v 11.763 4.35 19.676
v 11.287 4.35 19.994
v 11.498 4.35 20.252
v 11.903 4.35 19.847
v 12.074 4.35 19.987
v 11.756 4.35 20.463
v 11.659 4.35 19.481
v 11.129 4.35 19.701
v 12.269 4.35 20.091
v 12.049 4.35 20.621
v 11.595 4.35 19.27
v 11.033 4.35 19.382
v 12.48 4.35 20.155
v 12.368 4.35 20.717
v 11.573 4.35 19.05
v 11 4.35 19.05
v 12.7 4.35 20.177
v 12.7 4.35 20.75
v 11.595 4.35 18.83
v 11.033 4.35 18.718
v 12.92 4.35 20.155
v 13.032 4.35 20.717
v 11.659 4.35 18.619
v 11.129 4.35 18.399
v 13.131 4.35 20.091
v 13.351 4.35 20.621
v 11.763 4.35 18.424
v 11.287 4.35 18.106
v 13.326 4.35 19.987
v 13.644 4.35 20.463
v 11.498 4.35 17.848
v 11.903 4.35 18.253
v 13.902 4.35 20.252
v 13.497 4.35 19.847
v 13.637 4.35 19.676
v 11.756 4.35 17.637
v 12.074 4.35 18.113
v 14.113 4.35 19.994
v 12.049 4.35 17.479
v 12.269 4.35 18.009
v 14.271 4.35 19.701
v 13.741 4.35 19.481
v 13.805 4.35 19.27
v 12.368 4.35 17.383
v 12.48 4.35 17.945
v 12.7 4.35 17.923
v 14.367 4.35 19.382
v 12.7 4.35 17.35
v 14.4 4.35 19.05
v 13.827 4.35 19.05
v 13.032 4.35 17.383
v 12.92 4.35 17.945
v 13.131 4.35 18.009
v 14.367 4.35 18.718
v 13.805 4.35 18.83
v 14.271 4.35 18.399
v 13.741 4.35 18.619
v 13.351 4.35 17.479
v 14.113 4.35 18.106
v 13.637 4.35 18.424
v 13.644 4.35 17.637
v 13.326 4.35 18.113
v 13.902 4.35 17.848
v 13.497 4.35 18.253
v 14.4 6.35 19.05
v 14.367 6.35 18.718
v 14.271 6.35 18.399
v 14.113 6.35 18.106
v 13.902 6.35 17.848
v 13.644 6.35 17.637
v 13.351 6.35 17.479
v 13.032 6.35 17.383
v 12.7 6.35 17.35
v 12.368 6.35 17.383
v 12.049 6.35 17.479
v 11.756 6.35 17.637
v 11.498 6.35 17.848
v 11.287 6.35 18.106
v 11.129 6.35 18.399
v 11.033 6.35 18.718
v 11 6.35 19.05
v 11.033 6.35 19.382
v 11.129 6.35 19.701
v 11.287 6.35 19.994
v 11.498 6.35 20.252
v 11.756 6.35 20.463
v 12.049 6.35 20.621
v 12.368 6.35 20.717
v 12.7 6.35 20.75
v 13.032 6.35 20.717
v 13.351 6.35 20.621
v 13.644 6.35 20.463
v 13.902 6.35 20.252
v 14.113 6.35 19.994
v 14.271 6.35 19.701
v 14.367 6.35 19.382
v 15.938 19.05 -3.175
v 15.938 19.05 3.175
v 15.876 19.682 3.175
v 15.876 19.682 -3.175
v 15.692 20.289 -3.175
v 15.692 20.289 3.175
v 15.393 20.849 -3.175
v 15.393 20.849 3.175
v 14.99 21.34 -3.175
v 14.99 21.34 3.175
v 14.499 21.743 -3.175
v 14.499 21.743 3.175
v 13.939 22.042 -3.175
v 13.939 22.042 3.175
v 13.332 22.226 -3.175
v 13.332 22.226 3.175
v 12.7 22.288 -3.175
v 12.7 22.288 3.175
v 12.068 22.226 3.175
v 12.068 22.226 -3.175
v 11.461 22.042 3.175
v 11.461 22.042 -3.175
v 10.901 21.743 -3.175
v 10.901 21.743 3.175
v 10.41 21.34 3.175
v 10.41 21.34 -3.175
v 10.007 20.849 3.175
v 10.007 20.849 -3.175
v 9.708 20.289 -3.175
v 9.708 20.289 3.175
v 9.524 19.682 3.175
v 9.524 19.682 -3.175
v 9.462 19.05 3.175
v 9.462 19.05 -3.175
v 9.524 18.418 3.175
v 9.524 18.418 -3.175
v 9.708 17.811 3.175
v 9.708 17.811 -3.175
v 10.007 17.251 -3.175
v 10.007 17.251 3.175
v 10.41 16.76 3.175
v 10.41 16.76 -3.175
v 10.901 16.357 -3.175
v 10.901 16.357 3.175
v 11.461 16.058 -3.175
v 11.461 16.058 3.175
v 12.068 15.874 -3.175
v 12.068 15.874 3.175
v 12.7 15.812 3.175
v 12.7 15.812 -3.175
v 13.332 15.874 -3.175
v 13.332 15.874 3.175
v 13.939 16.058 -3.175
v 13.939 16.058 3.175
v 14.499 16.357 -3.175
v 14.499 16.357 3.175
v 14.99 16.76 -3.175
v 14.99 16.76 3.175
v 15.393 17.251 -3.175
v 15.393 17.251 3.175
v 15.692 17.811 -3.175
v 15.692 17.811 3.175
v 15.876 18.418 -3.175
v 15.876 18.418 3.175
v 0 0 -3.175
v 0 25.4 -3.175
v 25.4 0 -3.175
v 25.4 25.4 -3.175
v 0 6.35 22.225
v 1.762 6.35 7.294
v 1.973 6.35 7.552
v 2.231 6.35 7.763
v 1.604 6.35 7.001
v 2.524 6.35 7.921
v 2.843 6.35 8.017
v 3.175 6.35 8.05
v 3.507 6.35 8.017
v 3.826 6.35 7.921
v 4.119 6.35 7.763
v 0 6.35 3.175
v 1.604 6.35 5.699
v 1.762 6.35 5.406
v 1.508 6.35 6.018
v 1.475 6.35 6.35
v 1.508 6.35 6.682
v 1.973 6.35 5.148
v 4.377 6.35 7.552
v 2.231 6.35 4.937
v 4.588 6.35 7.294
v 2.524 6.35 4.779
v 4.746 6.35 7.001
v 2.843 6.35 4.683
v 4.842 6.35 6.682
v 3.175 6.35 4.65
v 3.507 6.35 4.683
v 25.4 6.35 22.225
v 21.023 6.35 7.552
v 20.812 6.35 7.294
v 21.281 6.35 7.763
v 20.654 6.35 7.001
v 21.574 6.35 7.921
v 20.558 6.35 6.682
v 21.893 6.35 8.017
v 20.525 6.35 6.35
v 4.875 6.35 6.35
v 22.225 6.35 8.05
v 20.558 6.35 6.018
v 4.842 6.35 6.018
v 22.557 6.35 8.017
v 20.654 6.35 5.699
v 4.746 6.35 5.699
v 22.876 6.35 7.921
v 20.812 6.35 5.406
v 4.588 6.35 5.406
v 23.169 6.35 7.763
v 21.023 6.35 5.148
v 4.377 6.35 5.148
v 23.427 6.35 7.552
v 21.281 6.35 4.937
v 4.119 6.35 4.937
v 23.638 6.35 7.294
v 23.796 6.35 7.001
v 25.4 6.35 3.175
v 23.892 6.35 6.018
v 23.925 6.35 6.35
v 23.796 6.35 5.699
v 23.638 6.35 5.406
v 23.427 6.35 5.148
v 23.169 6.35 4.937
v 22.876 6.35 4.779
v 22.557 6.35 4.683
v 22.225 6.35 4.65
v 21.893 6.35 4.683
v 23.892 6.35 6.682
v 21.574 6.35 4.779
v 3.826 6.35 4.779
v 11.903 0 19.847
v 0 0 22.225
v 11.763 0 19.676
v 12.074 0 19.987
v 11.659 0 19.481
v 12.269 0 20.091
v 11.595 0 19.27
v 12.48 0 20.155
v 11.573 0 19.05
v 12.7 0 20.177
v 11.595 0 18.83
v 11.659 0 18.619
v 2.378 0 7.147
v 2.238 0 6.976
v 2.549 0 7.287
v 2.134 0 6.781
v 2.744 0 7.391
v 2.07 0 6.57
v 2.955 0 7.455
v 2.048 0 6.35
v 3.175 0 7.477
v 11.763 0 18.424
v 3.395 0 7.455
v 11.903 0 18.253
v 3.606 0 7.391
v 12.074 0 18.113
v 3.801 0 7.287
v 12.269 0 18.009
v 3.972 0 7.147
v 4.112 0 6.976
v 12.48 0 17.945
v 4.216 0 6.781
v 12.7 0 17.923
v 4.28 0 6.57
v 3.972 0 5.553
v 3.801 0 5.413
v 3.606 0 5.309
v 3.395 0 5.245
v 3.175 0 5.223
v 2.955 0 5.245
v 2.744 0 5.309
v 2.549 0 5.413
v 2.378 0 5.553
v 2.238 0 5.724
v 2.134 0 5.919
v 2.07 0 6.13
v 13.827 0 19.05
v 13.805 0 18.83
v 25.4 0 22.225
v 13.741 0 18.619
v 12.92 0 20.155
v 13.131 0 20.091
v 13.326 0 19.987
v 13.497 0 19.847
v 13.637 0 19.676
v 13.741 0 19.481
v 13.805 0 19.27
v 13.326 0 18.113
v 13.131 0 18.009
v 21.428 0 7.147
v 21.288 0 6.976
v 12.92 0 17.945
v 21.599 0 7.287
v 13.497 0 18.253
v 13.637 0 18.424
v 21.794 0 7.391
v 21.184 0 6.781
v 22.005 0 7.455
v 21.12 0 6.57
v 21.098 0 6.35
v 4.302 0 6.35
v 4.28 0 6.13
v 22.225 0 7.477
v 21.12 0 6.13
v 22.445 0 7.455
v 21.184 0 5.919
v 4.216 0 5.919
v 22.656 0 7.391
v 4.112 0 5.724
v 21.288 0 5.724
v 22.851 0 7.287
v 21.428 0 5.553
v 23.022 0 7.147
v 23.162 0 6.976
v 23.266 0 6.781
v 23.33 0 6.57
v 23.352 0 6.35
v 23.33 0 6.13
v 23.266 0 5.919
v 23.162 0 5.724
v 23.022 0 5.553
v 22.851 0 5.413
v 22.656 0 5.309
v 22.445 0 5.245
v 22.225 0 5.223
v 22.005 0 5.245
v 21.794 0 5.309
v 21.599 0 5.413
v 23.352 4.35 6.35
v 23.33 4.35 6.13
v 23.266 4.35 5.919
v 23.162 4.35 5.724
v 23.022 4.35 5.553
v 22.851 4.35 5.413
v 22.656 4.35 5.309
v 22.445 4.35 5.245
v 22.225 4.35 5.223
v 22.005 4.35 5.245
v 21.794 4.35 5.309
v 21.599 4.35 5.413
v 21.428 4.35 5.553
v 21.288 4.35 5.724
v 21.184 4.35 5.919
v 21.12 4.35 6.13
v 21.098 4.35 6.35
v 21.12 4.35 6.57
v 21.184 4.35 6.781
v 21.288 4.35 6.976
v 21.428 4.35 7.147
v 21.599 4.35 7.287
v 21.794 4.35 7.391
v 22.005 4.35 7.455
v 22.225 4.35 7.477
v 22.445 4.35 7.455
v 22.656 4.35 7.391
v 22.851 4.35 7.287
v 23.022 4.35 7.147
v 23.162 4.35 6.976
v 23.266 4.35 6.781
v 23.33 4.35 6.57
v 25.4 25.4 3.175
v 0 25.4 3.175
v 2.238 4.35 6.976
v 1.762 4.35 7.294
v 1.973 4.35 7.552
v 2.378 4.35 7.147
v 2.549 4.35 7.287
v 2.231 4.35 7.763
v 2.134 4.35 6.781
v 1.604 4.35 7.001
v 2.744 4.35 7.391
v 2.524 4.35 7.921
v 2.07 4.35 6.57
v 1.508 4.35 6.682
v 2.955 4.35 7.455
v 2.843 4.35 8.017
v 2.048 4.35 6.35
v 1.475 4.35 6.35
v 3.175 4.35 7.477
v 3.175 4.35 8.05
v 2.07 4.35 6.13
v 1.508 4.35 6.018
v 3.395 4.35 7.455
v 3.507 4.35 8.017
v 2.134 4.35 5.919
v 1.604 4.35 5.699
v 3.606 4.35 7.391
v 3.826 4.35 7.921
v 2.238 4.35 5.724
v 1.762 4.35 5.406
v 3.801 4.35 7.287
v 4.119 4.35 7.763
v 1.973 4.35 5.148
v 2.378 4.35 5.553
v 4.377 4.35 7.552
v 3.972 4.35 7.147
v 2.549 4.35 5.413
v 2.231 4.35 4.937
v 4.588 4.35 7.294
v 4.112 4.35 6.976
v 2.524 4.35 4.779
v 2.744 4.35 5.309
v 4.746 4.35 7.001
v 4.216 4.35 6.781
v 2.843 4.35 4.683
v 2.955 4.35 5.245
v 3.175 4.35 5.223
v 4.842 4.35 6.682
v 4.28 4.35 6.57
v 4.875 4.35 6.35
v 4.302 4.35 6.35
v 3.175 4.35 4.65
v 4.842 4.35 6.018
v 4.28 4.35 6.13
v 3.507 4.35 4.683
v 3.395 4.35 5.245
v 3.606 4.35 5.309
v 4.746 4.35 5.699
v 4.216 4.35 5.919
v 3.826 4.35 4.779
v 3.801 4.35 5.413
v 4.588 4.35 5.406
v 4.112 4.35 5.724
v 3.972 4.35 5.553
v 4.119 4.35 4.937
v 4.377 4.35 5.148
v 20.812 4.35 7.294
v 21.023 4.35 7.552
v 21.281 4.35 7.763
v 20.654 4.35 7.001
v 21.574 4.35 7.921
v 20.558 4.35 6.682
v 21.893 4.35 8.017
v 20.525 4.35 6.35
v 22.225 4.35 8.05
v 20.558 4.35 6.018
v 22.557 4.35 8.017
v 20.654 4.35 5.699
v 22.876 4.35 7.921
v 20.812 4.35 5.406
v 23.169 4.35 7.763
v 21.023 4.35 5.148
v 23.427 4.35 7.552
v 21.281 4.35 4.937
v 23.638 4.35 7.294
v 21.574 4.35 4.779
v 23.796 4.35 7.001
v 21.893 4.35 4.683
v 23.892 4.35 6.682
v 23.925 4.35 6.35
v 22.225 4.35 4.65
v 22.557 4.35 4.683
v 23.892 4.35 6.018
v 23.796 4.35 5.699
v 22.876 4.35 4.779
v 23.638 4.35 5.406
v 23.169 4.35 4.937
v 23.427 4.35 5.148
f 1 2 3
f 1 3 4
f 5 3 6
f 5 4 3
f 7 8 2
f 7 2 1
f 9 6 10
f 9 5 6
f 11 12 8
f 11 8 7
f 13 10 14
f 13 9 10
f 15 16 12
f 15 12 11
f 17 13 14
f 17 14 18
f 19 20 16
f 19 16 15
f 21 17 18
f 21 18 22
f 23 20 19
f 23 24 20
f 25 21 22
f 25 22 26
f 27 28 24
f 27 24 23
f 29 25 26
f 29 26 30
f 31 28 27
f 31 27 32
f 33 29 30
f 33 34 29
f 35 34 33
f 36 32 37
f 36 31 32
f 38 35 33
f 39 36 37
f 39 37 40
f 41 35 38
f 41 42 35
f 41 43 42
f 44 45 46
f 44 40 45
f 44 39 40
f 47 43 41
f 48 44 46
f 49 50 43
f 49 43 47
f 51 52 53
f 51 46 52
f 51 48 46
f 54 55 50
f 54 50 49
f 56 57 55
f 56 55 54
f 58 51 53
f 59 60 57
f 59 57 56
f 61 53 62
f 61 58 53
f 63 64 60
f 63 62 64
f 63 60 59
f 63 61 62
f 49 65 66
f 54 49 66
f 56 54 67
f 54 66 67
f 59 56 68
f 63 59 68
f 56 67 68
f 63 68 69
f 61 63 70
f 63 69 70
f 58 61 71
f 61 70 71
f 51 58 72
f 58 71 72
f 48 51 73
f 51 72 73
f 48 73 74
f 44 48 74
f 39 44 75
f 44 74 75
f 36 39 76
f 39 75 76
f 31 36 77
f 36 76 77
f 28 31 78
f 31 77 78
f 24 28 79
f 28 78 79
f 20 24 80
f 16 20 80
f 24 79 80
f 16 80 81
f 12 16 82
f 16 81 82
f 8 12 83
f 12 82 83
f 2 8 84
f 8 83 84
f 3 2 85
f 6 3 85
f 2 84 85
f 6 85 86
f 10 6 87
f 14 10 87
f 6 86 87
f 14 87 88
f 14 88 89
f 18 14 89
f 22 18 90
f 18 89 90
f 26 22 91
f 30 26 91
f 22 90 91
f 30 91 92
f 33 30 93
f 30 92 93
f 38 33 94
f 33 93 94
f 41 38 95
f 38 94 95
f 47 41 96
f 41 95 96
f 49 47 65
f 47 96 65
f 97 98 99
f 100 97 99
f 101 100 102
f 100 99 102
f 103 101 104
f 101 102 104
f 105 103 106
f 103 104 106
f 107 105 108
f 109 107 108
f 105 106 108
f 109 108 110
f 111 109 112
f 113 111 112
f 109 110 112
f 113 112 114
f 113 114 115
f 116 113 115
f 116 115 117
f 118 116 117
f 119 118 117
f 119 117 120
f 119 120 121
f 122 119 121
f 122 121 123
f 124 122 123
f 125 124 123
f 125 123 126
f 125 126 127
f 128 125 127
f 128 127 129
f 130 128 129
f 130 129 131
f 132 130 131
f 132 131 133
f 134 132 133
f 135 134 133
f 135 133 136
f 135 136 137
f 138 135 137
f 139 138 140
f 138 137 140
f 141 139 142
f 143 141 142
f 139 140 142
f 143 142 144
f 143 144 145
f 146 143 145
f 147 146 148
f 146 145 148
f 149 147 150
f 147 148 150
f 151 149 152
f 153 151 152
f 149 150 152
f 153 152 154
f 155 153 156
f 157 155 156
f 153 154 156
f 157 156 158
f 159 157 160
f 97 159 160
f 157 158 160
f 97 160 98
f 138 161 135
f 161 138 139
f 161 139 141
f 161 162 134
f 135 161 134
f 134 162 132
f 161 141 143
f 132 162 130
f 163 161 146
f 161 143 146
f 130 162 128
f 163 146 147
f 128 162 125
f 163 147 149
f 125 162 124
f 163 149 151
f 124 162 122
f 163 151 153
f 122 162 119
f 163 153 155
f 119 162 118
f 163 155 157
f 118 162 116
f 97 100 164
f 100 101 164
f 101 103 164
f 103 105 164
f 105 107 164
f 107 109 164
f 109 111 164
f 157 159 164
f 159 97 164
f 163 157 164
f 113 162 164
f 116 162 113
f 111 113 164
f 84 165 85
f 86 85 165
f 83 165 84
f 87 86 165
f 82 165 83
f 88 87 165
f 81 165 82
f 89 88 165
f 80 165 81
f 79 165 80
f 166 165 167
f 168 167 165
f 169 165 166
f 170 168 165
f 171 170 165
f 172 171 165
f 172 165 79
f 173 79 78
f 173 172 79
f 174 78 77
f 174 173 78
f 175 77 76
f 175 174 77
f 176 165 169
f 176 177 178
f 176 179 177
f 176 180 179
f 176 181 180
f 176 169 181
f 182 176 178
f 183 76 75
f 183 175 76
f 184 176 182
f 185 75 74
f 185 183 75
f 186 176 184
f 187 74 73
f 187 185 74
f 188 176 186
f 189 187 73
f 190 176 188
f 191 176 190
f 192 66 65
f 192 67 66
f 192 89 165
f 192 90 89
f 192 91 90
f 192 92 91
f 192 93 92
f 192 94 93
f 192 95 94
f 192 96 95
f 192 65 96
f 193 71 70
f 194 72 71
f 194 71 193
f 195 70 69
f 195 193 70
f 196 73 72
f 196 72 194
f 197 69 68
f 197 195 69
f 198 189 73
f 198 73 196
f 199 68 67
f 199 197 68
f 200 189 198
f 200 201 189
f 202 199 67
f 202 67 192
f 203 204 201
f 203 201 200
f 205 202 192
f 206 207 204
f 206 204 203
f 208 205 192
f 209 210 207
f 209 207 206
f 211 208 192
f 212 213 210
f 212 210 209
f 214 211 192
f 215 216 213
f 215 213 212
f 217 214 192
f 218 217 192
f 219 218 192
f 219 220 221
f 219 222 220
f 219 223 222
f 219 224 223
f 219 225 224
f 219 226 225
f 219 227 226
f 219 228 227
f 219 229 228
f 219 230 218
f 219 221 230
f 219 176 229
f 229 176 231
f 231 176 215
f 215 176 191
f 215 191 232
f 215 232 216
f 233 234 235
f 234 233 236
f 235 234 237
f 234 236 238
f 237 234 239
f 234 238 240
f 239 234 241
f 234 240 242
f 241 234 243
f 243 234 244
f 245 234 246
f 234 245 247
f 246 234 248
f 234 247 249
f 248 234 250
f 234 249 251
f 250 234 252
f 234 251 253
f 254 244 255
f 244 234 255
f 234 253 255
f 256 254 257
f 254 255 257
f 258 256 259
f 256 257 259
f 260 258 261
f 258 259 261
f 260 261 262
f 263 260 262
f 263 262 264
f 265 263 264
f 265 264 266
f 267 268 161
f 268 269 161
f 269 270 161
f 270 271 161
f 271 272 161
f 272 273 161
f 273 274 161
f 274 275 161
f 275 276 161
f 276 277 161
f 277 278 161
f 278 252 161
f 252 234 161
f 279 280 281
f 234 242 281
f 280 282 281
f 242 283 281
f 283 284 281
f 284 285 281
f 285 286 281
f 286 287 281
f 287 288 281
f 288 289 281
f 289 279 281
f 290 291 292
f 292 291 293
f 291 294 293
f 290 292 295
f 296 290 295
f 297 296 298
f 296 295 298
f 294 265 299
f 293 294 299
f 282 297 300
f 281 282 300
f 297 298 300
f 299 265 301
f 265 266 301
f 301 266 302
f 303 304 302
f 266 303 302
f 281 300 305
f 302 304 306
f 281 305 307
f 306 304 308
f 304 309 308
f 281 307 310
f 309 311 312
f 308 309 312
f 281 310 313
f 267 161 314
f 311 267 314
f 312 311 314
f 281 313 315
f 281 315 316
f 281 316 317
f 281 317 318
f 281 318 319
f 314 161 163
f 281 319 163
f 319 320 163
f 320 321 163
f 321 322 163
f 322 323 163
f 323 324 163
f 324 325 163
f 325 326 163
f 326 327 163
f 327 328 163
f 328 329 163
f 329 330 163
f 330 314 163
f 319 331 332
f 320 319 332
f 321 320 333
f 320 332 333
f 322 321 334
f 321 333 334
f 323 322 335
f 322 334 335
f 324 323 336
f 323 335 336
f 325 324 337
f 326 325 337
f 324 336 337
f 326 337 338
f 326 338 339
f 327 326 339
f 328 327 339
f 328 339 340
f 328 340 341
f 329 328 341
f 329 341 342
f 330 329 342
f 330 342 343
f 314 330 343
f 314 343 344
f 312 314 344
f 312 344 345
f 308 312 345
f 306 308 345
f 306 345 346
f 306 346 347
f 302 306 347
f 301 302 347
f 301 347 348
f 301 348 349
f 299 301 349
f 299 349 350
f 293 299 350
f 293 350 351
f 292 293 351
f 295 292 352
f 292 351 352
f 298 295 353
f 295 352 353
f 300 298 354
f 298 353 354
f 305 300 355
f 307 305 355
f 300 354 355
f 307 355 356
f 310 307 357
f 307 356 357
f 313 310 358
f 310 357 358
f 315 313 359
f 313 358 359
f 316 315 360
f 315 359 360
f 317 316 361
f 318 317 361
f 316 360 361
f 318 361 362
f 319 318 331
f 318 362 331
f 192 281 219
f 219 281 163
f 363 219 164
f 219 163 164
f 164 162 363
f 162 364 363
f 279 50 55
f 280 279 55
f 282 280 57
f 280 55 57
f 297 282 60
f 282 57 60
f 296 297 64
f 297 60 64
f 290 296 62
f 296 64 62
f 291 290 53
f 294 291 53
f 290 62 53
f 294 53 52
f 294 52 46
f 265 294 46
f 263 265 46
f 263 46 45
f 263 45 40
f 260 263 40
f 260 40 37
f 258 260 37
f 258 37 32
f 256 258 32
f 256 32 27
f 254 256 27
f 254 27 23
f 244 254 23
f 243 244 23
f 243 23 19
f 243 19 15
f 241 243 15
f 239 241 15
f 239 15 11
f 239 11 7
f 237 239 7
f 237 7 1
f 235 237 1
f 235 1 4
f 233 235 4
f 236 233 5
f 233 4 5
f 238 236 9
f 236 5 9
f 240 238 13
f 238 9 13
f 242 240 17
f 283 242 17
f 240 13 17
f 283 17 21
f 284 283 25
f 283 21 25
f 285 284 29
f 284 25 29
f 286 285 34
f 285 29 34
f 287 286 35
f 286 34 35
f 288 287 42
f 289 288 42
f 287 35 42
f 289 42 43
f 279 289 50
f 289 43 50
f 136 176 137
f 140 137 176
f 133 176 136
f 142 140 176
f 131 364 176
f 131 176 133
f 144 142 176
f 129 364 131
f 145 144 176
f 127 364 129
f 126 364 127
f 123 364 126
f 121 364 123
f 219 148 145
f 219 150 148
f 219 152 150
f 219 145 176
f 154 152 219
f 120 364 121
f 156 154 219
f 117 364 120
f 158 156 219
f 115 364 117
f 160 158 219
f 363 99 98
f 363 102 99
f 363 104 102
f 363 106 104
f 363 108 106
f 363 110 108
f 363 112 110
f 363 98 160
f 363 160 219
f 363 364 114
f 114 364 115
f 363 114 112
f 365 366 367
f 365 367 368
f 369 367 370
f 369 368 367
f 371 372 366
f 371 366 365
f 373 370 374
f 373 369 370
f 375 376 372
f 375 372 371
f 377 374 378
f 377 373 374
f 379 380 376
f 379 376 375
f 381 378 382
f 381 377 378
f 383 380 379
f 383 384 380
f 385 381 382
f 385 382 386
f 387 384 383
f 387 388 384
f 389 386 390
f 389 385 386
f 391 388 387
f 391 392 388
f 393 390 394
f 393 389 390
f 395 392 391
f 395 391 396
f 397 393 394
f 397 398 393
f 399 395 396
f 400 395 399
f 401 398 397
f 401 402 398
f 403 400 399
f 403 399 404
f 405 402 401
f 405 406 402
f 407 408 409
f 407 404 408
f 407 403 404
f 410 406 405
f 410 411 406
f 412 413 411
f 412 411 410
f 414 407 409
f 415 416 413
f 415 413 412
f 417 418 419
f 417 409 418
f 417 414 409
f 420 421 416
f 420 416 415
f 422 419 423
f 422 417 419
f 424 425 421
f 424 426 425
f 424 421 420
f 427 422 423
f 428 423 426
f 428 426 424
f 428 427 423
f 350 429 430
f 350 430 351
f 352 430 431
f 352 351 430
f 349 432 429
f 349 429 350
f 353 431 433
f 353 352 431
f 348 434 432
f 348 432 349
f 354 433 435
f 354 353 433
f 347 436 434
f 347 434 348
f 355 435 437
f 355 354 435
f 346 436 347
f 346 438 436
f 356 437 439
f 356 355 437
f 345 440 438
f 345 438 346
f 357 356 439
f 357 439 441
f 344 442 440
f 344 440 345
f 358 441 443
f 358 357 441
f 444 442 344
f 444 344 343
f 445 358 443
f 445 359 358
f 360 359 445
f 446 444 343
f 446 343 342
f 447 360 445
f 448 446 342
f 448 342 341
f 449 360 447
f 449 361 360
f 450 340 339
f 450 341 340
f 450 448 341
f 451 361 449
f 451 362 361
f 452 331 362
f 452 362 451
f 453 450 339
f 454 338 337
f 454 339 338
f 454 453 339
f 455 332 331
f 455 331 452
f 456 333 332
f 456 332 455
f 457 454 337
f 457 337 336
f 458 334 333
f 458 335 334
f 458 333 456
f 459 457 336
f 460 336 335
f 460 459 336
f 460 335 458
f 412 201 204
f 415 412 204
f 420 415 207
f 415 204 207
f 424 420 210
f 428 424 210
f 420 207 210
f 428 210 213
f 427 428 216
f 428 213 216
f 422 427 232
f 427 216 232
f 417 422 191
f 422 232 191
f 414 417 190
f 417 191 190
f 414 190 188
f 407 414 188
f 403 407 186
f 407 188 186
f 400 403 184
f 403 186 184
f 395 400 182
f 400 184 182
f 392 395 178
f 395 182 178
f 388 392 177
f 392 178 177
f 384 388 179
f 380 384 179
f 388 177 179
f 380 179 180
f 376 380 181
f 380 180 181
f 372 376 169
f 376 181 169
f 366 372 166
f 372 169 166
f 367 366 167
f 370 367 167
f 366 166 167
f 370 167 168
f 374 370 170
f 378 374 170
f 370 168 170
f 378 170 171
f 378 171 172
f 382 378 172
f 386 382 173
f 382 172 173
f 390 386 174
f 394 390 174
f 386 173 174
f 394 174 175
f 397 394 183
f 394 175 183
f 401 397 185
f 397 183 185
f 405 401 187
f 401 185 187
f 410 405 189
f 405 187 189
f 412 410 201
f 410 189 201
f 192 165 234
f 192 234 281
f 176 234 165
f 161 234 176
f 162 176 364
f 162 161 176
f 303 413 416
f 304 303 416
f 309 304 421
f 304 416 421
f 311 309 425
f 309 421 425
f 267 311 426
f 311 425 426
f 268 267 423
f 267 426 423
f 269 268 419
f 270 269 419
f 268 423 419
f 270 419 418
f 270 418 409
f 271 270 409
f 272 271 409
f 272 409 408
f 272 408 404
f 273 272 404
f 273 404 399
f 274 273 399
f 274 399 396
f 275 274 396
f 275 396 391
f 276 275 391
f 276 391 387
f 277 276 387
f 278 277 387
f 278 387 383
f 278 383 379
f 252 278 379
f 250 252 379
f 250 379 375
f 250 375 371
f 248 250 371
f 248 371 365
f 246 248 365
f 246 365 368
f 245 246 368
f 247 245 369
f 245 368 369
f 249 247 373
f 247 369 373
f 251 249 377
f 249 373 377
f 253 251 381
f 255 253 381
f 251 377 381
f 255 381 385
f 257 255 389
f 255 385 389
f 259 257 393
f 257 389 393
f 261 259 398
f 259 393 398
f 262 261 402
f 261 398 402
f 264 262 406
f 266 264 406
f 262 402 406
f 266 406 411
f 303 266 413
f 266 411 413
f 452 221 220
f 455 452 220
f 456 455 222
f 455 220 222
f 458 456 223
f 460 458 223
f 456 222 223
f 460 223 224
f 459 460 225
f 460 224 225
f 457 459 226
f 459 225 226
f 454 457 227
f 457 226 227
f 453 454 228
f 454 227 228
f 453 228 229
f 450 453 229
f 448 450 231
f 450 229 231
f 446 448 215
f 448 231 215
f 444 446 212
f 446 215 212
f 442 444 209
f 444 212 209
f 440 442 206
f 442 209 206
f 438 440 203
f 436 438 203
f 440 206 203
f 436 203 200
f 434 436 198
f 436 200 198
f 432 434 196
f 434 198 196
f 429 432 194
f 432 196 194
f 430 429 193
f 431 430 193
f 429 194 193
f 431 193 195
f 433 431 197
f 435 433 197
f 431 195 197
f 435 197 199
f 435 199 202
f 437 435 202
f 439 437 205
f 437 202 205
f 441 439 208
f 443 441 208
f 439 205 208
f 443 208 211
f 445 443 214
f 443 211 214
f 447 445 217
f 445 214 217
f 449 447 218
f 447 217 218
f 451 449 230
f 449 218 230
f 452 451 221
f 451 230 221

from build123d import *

# Parameters (mm, degrees)
SKETCH1_W               = 25.4
SKETCH1_H               = 25.4
BOSS_EXTRUDE1_DEPTH     = 3.175
SKETCH2_W               = 25.4
SKETCH2_H               = 6.35
BOSS_EXTRUDE2_DEPTH     = 19.05
SKETCH4_R               = 1.127000032
CUT_EXTRUDE2_DEPTH      = 7.35
SKETCH9_R               = 1.700000029
CUT_EXTRUDE4_DEPTH      = 2.000000064
SKETCH3_R               = 3.2385
CUT_EXTRUDE1_DEPTH      = 20.05
CUT_EXTRUDE1_DEPTH_BACK = 7.35


with BuildPart() as part:
    # Sketch1 → Boss-Extrude1 (new body, symmetric)
    with BuildSketch(Plane.XY):
        with Locations((12.7, 12.7)):
            Rectangle(SKETCH1_W, SKETCH1_H)
    extrude(amount=BOSS_EXTRUDE1_DEPTH, both=True)

    # Sketch2 → Boss-Extrude2 (add)
    with BuildSketch(Plane.XY.offset(3.175)):
        with Locations((12.7, 3.175)):
            Rectangle(SKETCH2_W, SKETCH2_H)
    extrude(amount=BOSS_EXTRUDE2_DEPTH)

    # Sketch4 → Cut-Extrude2 (cut, through all)
    with BuildSketch(Plane(origin=(0, 6.35, 0), x_dir=(1, 0, 0), z_dir=(0, 1, 0))):
        with Locations((3.175, -6.35)):
            Circle(SKETCH4_R)
        with Locations((22.225, -6.35)):
            Circle(SKETCH4_R)
        with Locations((12.7, -19.05)):
            Circle(SKETCH4_R)
    extrude(amount=-CUT_EXTRUDE2_DEPTH, mode=Mode.SUBTRACT)

    # Sketch9 → Cut-Extrude4 (cut)
    with BuildSketch(Plane(origin=(0, 6.35, 0), x_dir=(1, 0, 0), z_dir=(0, 1, 0))):
        with Locations((3.175, -6.35)):
            Circle(SKETCH9_R)
        with Locations((22.225, -6.35)):
            Circle(SKETCH9_R)
        with Locations((12.7, -19.05)):
            Circle(SKETCH9_R)
    extrude(amount=-CUT_EXTRUDE4_DEPTH, mode=Mode.SUBTRACT)

    # Sketch3 → Cut-Extrude1 (cut, two sides)
    with BuildSketch(Plane.XY.offset(3.175)) as cut_extrude1_sk:
        with Locations((12.7, 19.05)):
            Circle(SKETCH3_R)
    extrude(amount=CUT_EXTRUDE1_DEPTH, mode=Mode.SUBTRACT)
    extrude(cut_extrude1_sk.sketch, amount=-CUT_EXTRUDE1_DEPTH_BACK, mode=Mode.SUBTRACT)


solid = part.part
